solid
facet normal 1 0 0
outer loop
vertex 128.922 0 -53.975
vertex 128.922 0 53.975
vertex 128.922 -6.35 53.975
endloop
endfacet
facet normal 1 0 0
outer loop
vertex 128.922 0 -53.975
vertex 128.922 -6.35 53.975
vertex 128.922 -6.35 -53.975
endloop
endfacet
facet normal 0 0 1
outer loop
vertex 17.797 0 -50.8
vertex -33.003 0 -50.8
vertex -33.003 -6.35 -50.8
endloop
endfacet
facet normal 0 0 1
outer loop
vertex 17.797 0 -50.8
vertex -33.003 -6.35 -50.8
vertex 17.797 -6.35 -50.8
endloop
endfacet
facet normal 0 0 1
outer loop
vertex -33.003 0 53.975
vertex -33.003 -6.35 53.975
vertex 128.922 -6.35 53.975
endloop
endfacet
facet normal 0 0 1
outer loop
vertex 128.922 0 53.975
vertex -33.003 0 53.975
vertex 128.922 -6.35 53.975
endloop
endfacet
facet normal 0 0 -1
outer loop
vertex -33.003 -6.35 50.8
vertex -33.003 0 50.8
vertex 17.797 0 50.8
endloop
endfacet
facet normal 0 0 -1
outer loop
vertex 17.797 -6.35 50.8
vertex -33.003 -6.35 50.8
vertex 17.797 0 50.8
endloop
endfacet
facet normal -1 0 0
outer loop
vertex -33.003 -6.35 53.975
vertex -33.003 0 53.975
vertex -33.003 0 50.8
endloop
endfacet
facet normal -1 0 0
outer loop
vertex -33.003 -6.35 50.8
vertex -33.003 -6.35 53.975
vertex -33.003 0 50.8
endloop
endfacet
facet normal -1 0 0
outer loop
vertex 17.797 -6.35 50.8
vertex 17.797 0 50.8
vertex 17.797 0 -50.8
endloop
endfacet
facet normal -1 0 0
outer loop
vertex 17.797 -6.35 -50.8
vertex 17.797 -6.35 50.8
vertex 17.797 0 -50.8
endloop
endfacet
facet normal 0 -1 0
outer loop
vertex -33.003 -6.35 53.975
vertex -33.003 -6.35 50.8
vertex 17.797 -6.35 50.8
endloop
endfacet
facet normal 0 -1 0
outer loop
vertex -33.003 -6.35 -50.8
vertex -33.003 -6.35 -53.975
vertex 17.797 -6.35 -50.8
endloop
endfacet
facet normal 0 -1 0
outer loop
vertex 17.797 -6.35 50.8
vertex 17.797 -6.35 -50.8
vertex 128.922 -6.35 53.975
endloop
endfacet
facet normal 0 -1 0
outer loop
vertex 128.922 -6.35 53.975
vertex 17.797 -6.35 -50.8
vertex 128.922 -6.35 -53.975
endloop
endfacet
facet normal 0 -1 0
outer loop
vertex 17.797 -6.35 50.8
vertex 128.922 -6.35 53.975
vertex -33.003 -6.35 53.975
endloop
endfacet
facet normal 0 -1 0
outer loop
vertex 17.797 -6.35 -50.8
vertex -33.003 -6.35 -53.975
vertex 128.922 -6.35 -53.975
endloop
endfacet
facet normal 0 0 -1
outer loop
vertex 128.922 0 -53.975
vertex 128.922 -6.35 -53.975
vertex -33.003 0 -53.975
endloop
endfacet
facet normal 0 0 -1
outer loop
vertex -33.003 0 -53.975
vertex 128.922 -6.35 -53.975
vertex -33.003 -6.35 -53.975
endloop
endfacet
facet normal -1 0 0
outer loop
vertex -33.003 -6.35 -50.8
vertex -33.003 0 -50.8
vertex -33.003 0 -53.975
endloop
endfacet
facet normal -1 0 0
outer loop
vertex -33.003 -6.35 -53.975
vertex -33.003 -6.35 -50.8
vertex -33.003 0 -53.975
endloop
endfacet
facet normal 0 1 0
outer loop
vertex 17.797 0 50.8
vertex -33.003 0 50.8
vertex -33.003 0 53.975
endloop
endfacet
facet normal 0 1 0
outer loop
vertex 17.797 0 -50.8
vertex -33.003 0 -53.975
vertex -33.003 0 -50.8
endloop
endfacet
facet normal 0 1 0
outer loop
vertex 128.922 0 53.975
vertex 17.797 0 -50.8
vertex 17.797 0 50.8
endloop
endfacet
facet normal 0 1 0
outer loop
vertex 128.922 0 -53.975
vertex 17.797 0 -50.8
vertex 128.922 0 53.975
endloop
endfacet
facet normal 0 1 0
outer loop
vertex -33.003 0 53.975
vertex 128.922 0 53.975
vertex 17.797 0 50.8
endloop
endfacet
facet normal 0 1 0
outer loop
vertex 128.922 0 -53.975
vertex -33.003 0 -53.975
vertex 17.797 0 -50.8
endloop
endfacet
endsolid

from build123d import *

# Parameters (mm, degrees)
SKETCH1_W               = 257.843094768
SKETCH1_H               = 107.95
BOSS_EXTRUDE1_DEPTH     = 6.35
BOSS_EXTRUDE2_DEPTH     = 19.05
SKETCH3_R               = 0.762
CUT_EXTRUDE1_DEPTH      = 6.35
SKETCH4_W               = 101.6
SKETCH4_H               = 101.6
CUT_EXTRUDE2_DEPTH      = 6.35
CUT_EXTRUDE3_DEPTH      = 35.56
CUT_EXTRUDE3_DEPTH_BACK = 45.974


with BuildPart() as part:
    # Sketch1 → Boss-Extrude1 (new body)
    with BuildSketch(Plane(origin=(0, 0, 0), x_dir=(1, 0, 0), z_dir=(0, 1, 0))):
        Rectangle(SKETCH1_W, SKETCH1_H)
    extrude(amount=-BOSS_EXTRUDE1_DEPTH)

    # Sketch1<3> → Boss-Extrude2 (add)
    with BuildSketch(Plane(origin=(0, 0, 0), x_dir=(1, 0, 0), z_dir=(0, 1, 0))):
        Polygon((-128.921547384, -53.975), (-122.571547384, -53.975), (-122.571547384, -45.339), (-125.746547384, -45.339), (-125.746547384, 45.339), (-122.571547384, 45.339), (-122.571547384, 53.975), (-128.921547384, 53.975), align=None)
        Polygon((-100.092547384, -45.339), (-100.092547384, -53.975), (-93.742547384, -53.975), (-93.742547384, 53.975), (-100.092547384, 53.975), (-100.092547384, 45.339), (-96.917547384, 45.339), (-96.917547384, -45.339), align=None)
    extrude(amount=BOSS_EXTRUDE2_DEPTH)

    # Sketch3 → Cut-Extrude1 (cut)
    with BuildSketch(Plane.XY.offset(53.975)):
        with Locations((-111.332047384, -1.651)):
            Circle(SKETCH3_R)
    cut_extrude1 = extrude(amount=-CUT_EXTRUDE1_DEPTH, mode=Mode.SUBTRACT)

    # Mirror1: Cut-Extrude1 across plane
    add(cut_extrude1.mirror(Plane.XY), mode=Mode.SUBTRACT)

    # Sketch4 → Cut-Extrude2 (cut)
    with BuildSketch(Plane(origin=(0, 0, 0), x_dir=(1, 0, 0), z_dir=(0, 1, 0))):
        with Locations((-33.003452616, 0)):
            Rectangle(SKETCH4_W, SKETCH4_H)
    extrude(amount=-CUT_EXTRUDE2_DEPTH, mode=Mode.SUBTRACT)

    # Sketch5 → Cut-Extrude3 (cut, two sides: drawn at the far end of the back side and taken through both)
    with BuildSketch(Plane(origin=(0, 0, 0), x_dir=(1, 0, 0), z_dir=(0, 1, 0)).offset(-CUT_EXTRUDE3_DEPTH_BACK)):
        Polygon((-33.003452616, -55.428475979), (-33.003452616, -50.8), (-33.003452616, 91.498778784), (-163.947958708, 91.498778784), (-163.947958708, -55.428475979), align=None)
    extrude(amount=CUT_EXTRUDE3_DEPTH + CUT_EXTRUDE3_DEPTH_BACK, mode=Mode.SUBTRACT)


solid = part.part
